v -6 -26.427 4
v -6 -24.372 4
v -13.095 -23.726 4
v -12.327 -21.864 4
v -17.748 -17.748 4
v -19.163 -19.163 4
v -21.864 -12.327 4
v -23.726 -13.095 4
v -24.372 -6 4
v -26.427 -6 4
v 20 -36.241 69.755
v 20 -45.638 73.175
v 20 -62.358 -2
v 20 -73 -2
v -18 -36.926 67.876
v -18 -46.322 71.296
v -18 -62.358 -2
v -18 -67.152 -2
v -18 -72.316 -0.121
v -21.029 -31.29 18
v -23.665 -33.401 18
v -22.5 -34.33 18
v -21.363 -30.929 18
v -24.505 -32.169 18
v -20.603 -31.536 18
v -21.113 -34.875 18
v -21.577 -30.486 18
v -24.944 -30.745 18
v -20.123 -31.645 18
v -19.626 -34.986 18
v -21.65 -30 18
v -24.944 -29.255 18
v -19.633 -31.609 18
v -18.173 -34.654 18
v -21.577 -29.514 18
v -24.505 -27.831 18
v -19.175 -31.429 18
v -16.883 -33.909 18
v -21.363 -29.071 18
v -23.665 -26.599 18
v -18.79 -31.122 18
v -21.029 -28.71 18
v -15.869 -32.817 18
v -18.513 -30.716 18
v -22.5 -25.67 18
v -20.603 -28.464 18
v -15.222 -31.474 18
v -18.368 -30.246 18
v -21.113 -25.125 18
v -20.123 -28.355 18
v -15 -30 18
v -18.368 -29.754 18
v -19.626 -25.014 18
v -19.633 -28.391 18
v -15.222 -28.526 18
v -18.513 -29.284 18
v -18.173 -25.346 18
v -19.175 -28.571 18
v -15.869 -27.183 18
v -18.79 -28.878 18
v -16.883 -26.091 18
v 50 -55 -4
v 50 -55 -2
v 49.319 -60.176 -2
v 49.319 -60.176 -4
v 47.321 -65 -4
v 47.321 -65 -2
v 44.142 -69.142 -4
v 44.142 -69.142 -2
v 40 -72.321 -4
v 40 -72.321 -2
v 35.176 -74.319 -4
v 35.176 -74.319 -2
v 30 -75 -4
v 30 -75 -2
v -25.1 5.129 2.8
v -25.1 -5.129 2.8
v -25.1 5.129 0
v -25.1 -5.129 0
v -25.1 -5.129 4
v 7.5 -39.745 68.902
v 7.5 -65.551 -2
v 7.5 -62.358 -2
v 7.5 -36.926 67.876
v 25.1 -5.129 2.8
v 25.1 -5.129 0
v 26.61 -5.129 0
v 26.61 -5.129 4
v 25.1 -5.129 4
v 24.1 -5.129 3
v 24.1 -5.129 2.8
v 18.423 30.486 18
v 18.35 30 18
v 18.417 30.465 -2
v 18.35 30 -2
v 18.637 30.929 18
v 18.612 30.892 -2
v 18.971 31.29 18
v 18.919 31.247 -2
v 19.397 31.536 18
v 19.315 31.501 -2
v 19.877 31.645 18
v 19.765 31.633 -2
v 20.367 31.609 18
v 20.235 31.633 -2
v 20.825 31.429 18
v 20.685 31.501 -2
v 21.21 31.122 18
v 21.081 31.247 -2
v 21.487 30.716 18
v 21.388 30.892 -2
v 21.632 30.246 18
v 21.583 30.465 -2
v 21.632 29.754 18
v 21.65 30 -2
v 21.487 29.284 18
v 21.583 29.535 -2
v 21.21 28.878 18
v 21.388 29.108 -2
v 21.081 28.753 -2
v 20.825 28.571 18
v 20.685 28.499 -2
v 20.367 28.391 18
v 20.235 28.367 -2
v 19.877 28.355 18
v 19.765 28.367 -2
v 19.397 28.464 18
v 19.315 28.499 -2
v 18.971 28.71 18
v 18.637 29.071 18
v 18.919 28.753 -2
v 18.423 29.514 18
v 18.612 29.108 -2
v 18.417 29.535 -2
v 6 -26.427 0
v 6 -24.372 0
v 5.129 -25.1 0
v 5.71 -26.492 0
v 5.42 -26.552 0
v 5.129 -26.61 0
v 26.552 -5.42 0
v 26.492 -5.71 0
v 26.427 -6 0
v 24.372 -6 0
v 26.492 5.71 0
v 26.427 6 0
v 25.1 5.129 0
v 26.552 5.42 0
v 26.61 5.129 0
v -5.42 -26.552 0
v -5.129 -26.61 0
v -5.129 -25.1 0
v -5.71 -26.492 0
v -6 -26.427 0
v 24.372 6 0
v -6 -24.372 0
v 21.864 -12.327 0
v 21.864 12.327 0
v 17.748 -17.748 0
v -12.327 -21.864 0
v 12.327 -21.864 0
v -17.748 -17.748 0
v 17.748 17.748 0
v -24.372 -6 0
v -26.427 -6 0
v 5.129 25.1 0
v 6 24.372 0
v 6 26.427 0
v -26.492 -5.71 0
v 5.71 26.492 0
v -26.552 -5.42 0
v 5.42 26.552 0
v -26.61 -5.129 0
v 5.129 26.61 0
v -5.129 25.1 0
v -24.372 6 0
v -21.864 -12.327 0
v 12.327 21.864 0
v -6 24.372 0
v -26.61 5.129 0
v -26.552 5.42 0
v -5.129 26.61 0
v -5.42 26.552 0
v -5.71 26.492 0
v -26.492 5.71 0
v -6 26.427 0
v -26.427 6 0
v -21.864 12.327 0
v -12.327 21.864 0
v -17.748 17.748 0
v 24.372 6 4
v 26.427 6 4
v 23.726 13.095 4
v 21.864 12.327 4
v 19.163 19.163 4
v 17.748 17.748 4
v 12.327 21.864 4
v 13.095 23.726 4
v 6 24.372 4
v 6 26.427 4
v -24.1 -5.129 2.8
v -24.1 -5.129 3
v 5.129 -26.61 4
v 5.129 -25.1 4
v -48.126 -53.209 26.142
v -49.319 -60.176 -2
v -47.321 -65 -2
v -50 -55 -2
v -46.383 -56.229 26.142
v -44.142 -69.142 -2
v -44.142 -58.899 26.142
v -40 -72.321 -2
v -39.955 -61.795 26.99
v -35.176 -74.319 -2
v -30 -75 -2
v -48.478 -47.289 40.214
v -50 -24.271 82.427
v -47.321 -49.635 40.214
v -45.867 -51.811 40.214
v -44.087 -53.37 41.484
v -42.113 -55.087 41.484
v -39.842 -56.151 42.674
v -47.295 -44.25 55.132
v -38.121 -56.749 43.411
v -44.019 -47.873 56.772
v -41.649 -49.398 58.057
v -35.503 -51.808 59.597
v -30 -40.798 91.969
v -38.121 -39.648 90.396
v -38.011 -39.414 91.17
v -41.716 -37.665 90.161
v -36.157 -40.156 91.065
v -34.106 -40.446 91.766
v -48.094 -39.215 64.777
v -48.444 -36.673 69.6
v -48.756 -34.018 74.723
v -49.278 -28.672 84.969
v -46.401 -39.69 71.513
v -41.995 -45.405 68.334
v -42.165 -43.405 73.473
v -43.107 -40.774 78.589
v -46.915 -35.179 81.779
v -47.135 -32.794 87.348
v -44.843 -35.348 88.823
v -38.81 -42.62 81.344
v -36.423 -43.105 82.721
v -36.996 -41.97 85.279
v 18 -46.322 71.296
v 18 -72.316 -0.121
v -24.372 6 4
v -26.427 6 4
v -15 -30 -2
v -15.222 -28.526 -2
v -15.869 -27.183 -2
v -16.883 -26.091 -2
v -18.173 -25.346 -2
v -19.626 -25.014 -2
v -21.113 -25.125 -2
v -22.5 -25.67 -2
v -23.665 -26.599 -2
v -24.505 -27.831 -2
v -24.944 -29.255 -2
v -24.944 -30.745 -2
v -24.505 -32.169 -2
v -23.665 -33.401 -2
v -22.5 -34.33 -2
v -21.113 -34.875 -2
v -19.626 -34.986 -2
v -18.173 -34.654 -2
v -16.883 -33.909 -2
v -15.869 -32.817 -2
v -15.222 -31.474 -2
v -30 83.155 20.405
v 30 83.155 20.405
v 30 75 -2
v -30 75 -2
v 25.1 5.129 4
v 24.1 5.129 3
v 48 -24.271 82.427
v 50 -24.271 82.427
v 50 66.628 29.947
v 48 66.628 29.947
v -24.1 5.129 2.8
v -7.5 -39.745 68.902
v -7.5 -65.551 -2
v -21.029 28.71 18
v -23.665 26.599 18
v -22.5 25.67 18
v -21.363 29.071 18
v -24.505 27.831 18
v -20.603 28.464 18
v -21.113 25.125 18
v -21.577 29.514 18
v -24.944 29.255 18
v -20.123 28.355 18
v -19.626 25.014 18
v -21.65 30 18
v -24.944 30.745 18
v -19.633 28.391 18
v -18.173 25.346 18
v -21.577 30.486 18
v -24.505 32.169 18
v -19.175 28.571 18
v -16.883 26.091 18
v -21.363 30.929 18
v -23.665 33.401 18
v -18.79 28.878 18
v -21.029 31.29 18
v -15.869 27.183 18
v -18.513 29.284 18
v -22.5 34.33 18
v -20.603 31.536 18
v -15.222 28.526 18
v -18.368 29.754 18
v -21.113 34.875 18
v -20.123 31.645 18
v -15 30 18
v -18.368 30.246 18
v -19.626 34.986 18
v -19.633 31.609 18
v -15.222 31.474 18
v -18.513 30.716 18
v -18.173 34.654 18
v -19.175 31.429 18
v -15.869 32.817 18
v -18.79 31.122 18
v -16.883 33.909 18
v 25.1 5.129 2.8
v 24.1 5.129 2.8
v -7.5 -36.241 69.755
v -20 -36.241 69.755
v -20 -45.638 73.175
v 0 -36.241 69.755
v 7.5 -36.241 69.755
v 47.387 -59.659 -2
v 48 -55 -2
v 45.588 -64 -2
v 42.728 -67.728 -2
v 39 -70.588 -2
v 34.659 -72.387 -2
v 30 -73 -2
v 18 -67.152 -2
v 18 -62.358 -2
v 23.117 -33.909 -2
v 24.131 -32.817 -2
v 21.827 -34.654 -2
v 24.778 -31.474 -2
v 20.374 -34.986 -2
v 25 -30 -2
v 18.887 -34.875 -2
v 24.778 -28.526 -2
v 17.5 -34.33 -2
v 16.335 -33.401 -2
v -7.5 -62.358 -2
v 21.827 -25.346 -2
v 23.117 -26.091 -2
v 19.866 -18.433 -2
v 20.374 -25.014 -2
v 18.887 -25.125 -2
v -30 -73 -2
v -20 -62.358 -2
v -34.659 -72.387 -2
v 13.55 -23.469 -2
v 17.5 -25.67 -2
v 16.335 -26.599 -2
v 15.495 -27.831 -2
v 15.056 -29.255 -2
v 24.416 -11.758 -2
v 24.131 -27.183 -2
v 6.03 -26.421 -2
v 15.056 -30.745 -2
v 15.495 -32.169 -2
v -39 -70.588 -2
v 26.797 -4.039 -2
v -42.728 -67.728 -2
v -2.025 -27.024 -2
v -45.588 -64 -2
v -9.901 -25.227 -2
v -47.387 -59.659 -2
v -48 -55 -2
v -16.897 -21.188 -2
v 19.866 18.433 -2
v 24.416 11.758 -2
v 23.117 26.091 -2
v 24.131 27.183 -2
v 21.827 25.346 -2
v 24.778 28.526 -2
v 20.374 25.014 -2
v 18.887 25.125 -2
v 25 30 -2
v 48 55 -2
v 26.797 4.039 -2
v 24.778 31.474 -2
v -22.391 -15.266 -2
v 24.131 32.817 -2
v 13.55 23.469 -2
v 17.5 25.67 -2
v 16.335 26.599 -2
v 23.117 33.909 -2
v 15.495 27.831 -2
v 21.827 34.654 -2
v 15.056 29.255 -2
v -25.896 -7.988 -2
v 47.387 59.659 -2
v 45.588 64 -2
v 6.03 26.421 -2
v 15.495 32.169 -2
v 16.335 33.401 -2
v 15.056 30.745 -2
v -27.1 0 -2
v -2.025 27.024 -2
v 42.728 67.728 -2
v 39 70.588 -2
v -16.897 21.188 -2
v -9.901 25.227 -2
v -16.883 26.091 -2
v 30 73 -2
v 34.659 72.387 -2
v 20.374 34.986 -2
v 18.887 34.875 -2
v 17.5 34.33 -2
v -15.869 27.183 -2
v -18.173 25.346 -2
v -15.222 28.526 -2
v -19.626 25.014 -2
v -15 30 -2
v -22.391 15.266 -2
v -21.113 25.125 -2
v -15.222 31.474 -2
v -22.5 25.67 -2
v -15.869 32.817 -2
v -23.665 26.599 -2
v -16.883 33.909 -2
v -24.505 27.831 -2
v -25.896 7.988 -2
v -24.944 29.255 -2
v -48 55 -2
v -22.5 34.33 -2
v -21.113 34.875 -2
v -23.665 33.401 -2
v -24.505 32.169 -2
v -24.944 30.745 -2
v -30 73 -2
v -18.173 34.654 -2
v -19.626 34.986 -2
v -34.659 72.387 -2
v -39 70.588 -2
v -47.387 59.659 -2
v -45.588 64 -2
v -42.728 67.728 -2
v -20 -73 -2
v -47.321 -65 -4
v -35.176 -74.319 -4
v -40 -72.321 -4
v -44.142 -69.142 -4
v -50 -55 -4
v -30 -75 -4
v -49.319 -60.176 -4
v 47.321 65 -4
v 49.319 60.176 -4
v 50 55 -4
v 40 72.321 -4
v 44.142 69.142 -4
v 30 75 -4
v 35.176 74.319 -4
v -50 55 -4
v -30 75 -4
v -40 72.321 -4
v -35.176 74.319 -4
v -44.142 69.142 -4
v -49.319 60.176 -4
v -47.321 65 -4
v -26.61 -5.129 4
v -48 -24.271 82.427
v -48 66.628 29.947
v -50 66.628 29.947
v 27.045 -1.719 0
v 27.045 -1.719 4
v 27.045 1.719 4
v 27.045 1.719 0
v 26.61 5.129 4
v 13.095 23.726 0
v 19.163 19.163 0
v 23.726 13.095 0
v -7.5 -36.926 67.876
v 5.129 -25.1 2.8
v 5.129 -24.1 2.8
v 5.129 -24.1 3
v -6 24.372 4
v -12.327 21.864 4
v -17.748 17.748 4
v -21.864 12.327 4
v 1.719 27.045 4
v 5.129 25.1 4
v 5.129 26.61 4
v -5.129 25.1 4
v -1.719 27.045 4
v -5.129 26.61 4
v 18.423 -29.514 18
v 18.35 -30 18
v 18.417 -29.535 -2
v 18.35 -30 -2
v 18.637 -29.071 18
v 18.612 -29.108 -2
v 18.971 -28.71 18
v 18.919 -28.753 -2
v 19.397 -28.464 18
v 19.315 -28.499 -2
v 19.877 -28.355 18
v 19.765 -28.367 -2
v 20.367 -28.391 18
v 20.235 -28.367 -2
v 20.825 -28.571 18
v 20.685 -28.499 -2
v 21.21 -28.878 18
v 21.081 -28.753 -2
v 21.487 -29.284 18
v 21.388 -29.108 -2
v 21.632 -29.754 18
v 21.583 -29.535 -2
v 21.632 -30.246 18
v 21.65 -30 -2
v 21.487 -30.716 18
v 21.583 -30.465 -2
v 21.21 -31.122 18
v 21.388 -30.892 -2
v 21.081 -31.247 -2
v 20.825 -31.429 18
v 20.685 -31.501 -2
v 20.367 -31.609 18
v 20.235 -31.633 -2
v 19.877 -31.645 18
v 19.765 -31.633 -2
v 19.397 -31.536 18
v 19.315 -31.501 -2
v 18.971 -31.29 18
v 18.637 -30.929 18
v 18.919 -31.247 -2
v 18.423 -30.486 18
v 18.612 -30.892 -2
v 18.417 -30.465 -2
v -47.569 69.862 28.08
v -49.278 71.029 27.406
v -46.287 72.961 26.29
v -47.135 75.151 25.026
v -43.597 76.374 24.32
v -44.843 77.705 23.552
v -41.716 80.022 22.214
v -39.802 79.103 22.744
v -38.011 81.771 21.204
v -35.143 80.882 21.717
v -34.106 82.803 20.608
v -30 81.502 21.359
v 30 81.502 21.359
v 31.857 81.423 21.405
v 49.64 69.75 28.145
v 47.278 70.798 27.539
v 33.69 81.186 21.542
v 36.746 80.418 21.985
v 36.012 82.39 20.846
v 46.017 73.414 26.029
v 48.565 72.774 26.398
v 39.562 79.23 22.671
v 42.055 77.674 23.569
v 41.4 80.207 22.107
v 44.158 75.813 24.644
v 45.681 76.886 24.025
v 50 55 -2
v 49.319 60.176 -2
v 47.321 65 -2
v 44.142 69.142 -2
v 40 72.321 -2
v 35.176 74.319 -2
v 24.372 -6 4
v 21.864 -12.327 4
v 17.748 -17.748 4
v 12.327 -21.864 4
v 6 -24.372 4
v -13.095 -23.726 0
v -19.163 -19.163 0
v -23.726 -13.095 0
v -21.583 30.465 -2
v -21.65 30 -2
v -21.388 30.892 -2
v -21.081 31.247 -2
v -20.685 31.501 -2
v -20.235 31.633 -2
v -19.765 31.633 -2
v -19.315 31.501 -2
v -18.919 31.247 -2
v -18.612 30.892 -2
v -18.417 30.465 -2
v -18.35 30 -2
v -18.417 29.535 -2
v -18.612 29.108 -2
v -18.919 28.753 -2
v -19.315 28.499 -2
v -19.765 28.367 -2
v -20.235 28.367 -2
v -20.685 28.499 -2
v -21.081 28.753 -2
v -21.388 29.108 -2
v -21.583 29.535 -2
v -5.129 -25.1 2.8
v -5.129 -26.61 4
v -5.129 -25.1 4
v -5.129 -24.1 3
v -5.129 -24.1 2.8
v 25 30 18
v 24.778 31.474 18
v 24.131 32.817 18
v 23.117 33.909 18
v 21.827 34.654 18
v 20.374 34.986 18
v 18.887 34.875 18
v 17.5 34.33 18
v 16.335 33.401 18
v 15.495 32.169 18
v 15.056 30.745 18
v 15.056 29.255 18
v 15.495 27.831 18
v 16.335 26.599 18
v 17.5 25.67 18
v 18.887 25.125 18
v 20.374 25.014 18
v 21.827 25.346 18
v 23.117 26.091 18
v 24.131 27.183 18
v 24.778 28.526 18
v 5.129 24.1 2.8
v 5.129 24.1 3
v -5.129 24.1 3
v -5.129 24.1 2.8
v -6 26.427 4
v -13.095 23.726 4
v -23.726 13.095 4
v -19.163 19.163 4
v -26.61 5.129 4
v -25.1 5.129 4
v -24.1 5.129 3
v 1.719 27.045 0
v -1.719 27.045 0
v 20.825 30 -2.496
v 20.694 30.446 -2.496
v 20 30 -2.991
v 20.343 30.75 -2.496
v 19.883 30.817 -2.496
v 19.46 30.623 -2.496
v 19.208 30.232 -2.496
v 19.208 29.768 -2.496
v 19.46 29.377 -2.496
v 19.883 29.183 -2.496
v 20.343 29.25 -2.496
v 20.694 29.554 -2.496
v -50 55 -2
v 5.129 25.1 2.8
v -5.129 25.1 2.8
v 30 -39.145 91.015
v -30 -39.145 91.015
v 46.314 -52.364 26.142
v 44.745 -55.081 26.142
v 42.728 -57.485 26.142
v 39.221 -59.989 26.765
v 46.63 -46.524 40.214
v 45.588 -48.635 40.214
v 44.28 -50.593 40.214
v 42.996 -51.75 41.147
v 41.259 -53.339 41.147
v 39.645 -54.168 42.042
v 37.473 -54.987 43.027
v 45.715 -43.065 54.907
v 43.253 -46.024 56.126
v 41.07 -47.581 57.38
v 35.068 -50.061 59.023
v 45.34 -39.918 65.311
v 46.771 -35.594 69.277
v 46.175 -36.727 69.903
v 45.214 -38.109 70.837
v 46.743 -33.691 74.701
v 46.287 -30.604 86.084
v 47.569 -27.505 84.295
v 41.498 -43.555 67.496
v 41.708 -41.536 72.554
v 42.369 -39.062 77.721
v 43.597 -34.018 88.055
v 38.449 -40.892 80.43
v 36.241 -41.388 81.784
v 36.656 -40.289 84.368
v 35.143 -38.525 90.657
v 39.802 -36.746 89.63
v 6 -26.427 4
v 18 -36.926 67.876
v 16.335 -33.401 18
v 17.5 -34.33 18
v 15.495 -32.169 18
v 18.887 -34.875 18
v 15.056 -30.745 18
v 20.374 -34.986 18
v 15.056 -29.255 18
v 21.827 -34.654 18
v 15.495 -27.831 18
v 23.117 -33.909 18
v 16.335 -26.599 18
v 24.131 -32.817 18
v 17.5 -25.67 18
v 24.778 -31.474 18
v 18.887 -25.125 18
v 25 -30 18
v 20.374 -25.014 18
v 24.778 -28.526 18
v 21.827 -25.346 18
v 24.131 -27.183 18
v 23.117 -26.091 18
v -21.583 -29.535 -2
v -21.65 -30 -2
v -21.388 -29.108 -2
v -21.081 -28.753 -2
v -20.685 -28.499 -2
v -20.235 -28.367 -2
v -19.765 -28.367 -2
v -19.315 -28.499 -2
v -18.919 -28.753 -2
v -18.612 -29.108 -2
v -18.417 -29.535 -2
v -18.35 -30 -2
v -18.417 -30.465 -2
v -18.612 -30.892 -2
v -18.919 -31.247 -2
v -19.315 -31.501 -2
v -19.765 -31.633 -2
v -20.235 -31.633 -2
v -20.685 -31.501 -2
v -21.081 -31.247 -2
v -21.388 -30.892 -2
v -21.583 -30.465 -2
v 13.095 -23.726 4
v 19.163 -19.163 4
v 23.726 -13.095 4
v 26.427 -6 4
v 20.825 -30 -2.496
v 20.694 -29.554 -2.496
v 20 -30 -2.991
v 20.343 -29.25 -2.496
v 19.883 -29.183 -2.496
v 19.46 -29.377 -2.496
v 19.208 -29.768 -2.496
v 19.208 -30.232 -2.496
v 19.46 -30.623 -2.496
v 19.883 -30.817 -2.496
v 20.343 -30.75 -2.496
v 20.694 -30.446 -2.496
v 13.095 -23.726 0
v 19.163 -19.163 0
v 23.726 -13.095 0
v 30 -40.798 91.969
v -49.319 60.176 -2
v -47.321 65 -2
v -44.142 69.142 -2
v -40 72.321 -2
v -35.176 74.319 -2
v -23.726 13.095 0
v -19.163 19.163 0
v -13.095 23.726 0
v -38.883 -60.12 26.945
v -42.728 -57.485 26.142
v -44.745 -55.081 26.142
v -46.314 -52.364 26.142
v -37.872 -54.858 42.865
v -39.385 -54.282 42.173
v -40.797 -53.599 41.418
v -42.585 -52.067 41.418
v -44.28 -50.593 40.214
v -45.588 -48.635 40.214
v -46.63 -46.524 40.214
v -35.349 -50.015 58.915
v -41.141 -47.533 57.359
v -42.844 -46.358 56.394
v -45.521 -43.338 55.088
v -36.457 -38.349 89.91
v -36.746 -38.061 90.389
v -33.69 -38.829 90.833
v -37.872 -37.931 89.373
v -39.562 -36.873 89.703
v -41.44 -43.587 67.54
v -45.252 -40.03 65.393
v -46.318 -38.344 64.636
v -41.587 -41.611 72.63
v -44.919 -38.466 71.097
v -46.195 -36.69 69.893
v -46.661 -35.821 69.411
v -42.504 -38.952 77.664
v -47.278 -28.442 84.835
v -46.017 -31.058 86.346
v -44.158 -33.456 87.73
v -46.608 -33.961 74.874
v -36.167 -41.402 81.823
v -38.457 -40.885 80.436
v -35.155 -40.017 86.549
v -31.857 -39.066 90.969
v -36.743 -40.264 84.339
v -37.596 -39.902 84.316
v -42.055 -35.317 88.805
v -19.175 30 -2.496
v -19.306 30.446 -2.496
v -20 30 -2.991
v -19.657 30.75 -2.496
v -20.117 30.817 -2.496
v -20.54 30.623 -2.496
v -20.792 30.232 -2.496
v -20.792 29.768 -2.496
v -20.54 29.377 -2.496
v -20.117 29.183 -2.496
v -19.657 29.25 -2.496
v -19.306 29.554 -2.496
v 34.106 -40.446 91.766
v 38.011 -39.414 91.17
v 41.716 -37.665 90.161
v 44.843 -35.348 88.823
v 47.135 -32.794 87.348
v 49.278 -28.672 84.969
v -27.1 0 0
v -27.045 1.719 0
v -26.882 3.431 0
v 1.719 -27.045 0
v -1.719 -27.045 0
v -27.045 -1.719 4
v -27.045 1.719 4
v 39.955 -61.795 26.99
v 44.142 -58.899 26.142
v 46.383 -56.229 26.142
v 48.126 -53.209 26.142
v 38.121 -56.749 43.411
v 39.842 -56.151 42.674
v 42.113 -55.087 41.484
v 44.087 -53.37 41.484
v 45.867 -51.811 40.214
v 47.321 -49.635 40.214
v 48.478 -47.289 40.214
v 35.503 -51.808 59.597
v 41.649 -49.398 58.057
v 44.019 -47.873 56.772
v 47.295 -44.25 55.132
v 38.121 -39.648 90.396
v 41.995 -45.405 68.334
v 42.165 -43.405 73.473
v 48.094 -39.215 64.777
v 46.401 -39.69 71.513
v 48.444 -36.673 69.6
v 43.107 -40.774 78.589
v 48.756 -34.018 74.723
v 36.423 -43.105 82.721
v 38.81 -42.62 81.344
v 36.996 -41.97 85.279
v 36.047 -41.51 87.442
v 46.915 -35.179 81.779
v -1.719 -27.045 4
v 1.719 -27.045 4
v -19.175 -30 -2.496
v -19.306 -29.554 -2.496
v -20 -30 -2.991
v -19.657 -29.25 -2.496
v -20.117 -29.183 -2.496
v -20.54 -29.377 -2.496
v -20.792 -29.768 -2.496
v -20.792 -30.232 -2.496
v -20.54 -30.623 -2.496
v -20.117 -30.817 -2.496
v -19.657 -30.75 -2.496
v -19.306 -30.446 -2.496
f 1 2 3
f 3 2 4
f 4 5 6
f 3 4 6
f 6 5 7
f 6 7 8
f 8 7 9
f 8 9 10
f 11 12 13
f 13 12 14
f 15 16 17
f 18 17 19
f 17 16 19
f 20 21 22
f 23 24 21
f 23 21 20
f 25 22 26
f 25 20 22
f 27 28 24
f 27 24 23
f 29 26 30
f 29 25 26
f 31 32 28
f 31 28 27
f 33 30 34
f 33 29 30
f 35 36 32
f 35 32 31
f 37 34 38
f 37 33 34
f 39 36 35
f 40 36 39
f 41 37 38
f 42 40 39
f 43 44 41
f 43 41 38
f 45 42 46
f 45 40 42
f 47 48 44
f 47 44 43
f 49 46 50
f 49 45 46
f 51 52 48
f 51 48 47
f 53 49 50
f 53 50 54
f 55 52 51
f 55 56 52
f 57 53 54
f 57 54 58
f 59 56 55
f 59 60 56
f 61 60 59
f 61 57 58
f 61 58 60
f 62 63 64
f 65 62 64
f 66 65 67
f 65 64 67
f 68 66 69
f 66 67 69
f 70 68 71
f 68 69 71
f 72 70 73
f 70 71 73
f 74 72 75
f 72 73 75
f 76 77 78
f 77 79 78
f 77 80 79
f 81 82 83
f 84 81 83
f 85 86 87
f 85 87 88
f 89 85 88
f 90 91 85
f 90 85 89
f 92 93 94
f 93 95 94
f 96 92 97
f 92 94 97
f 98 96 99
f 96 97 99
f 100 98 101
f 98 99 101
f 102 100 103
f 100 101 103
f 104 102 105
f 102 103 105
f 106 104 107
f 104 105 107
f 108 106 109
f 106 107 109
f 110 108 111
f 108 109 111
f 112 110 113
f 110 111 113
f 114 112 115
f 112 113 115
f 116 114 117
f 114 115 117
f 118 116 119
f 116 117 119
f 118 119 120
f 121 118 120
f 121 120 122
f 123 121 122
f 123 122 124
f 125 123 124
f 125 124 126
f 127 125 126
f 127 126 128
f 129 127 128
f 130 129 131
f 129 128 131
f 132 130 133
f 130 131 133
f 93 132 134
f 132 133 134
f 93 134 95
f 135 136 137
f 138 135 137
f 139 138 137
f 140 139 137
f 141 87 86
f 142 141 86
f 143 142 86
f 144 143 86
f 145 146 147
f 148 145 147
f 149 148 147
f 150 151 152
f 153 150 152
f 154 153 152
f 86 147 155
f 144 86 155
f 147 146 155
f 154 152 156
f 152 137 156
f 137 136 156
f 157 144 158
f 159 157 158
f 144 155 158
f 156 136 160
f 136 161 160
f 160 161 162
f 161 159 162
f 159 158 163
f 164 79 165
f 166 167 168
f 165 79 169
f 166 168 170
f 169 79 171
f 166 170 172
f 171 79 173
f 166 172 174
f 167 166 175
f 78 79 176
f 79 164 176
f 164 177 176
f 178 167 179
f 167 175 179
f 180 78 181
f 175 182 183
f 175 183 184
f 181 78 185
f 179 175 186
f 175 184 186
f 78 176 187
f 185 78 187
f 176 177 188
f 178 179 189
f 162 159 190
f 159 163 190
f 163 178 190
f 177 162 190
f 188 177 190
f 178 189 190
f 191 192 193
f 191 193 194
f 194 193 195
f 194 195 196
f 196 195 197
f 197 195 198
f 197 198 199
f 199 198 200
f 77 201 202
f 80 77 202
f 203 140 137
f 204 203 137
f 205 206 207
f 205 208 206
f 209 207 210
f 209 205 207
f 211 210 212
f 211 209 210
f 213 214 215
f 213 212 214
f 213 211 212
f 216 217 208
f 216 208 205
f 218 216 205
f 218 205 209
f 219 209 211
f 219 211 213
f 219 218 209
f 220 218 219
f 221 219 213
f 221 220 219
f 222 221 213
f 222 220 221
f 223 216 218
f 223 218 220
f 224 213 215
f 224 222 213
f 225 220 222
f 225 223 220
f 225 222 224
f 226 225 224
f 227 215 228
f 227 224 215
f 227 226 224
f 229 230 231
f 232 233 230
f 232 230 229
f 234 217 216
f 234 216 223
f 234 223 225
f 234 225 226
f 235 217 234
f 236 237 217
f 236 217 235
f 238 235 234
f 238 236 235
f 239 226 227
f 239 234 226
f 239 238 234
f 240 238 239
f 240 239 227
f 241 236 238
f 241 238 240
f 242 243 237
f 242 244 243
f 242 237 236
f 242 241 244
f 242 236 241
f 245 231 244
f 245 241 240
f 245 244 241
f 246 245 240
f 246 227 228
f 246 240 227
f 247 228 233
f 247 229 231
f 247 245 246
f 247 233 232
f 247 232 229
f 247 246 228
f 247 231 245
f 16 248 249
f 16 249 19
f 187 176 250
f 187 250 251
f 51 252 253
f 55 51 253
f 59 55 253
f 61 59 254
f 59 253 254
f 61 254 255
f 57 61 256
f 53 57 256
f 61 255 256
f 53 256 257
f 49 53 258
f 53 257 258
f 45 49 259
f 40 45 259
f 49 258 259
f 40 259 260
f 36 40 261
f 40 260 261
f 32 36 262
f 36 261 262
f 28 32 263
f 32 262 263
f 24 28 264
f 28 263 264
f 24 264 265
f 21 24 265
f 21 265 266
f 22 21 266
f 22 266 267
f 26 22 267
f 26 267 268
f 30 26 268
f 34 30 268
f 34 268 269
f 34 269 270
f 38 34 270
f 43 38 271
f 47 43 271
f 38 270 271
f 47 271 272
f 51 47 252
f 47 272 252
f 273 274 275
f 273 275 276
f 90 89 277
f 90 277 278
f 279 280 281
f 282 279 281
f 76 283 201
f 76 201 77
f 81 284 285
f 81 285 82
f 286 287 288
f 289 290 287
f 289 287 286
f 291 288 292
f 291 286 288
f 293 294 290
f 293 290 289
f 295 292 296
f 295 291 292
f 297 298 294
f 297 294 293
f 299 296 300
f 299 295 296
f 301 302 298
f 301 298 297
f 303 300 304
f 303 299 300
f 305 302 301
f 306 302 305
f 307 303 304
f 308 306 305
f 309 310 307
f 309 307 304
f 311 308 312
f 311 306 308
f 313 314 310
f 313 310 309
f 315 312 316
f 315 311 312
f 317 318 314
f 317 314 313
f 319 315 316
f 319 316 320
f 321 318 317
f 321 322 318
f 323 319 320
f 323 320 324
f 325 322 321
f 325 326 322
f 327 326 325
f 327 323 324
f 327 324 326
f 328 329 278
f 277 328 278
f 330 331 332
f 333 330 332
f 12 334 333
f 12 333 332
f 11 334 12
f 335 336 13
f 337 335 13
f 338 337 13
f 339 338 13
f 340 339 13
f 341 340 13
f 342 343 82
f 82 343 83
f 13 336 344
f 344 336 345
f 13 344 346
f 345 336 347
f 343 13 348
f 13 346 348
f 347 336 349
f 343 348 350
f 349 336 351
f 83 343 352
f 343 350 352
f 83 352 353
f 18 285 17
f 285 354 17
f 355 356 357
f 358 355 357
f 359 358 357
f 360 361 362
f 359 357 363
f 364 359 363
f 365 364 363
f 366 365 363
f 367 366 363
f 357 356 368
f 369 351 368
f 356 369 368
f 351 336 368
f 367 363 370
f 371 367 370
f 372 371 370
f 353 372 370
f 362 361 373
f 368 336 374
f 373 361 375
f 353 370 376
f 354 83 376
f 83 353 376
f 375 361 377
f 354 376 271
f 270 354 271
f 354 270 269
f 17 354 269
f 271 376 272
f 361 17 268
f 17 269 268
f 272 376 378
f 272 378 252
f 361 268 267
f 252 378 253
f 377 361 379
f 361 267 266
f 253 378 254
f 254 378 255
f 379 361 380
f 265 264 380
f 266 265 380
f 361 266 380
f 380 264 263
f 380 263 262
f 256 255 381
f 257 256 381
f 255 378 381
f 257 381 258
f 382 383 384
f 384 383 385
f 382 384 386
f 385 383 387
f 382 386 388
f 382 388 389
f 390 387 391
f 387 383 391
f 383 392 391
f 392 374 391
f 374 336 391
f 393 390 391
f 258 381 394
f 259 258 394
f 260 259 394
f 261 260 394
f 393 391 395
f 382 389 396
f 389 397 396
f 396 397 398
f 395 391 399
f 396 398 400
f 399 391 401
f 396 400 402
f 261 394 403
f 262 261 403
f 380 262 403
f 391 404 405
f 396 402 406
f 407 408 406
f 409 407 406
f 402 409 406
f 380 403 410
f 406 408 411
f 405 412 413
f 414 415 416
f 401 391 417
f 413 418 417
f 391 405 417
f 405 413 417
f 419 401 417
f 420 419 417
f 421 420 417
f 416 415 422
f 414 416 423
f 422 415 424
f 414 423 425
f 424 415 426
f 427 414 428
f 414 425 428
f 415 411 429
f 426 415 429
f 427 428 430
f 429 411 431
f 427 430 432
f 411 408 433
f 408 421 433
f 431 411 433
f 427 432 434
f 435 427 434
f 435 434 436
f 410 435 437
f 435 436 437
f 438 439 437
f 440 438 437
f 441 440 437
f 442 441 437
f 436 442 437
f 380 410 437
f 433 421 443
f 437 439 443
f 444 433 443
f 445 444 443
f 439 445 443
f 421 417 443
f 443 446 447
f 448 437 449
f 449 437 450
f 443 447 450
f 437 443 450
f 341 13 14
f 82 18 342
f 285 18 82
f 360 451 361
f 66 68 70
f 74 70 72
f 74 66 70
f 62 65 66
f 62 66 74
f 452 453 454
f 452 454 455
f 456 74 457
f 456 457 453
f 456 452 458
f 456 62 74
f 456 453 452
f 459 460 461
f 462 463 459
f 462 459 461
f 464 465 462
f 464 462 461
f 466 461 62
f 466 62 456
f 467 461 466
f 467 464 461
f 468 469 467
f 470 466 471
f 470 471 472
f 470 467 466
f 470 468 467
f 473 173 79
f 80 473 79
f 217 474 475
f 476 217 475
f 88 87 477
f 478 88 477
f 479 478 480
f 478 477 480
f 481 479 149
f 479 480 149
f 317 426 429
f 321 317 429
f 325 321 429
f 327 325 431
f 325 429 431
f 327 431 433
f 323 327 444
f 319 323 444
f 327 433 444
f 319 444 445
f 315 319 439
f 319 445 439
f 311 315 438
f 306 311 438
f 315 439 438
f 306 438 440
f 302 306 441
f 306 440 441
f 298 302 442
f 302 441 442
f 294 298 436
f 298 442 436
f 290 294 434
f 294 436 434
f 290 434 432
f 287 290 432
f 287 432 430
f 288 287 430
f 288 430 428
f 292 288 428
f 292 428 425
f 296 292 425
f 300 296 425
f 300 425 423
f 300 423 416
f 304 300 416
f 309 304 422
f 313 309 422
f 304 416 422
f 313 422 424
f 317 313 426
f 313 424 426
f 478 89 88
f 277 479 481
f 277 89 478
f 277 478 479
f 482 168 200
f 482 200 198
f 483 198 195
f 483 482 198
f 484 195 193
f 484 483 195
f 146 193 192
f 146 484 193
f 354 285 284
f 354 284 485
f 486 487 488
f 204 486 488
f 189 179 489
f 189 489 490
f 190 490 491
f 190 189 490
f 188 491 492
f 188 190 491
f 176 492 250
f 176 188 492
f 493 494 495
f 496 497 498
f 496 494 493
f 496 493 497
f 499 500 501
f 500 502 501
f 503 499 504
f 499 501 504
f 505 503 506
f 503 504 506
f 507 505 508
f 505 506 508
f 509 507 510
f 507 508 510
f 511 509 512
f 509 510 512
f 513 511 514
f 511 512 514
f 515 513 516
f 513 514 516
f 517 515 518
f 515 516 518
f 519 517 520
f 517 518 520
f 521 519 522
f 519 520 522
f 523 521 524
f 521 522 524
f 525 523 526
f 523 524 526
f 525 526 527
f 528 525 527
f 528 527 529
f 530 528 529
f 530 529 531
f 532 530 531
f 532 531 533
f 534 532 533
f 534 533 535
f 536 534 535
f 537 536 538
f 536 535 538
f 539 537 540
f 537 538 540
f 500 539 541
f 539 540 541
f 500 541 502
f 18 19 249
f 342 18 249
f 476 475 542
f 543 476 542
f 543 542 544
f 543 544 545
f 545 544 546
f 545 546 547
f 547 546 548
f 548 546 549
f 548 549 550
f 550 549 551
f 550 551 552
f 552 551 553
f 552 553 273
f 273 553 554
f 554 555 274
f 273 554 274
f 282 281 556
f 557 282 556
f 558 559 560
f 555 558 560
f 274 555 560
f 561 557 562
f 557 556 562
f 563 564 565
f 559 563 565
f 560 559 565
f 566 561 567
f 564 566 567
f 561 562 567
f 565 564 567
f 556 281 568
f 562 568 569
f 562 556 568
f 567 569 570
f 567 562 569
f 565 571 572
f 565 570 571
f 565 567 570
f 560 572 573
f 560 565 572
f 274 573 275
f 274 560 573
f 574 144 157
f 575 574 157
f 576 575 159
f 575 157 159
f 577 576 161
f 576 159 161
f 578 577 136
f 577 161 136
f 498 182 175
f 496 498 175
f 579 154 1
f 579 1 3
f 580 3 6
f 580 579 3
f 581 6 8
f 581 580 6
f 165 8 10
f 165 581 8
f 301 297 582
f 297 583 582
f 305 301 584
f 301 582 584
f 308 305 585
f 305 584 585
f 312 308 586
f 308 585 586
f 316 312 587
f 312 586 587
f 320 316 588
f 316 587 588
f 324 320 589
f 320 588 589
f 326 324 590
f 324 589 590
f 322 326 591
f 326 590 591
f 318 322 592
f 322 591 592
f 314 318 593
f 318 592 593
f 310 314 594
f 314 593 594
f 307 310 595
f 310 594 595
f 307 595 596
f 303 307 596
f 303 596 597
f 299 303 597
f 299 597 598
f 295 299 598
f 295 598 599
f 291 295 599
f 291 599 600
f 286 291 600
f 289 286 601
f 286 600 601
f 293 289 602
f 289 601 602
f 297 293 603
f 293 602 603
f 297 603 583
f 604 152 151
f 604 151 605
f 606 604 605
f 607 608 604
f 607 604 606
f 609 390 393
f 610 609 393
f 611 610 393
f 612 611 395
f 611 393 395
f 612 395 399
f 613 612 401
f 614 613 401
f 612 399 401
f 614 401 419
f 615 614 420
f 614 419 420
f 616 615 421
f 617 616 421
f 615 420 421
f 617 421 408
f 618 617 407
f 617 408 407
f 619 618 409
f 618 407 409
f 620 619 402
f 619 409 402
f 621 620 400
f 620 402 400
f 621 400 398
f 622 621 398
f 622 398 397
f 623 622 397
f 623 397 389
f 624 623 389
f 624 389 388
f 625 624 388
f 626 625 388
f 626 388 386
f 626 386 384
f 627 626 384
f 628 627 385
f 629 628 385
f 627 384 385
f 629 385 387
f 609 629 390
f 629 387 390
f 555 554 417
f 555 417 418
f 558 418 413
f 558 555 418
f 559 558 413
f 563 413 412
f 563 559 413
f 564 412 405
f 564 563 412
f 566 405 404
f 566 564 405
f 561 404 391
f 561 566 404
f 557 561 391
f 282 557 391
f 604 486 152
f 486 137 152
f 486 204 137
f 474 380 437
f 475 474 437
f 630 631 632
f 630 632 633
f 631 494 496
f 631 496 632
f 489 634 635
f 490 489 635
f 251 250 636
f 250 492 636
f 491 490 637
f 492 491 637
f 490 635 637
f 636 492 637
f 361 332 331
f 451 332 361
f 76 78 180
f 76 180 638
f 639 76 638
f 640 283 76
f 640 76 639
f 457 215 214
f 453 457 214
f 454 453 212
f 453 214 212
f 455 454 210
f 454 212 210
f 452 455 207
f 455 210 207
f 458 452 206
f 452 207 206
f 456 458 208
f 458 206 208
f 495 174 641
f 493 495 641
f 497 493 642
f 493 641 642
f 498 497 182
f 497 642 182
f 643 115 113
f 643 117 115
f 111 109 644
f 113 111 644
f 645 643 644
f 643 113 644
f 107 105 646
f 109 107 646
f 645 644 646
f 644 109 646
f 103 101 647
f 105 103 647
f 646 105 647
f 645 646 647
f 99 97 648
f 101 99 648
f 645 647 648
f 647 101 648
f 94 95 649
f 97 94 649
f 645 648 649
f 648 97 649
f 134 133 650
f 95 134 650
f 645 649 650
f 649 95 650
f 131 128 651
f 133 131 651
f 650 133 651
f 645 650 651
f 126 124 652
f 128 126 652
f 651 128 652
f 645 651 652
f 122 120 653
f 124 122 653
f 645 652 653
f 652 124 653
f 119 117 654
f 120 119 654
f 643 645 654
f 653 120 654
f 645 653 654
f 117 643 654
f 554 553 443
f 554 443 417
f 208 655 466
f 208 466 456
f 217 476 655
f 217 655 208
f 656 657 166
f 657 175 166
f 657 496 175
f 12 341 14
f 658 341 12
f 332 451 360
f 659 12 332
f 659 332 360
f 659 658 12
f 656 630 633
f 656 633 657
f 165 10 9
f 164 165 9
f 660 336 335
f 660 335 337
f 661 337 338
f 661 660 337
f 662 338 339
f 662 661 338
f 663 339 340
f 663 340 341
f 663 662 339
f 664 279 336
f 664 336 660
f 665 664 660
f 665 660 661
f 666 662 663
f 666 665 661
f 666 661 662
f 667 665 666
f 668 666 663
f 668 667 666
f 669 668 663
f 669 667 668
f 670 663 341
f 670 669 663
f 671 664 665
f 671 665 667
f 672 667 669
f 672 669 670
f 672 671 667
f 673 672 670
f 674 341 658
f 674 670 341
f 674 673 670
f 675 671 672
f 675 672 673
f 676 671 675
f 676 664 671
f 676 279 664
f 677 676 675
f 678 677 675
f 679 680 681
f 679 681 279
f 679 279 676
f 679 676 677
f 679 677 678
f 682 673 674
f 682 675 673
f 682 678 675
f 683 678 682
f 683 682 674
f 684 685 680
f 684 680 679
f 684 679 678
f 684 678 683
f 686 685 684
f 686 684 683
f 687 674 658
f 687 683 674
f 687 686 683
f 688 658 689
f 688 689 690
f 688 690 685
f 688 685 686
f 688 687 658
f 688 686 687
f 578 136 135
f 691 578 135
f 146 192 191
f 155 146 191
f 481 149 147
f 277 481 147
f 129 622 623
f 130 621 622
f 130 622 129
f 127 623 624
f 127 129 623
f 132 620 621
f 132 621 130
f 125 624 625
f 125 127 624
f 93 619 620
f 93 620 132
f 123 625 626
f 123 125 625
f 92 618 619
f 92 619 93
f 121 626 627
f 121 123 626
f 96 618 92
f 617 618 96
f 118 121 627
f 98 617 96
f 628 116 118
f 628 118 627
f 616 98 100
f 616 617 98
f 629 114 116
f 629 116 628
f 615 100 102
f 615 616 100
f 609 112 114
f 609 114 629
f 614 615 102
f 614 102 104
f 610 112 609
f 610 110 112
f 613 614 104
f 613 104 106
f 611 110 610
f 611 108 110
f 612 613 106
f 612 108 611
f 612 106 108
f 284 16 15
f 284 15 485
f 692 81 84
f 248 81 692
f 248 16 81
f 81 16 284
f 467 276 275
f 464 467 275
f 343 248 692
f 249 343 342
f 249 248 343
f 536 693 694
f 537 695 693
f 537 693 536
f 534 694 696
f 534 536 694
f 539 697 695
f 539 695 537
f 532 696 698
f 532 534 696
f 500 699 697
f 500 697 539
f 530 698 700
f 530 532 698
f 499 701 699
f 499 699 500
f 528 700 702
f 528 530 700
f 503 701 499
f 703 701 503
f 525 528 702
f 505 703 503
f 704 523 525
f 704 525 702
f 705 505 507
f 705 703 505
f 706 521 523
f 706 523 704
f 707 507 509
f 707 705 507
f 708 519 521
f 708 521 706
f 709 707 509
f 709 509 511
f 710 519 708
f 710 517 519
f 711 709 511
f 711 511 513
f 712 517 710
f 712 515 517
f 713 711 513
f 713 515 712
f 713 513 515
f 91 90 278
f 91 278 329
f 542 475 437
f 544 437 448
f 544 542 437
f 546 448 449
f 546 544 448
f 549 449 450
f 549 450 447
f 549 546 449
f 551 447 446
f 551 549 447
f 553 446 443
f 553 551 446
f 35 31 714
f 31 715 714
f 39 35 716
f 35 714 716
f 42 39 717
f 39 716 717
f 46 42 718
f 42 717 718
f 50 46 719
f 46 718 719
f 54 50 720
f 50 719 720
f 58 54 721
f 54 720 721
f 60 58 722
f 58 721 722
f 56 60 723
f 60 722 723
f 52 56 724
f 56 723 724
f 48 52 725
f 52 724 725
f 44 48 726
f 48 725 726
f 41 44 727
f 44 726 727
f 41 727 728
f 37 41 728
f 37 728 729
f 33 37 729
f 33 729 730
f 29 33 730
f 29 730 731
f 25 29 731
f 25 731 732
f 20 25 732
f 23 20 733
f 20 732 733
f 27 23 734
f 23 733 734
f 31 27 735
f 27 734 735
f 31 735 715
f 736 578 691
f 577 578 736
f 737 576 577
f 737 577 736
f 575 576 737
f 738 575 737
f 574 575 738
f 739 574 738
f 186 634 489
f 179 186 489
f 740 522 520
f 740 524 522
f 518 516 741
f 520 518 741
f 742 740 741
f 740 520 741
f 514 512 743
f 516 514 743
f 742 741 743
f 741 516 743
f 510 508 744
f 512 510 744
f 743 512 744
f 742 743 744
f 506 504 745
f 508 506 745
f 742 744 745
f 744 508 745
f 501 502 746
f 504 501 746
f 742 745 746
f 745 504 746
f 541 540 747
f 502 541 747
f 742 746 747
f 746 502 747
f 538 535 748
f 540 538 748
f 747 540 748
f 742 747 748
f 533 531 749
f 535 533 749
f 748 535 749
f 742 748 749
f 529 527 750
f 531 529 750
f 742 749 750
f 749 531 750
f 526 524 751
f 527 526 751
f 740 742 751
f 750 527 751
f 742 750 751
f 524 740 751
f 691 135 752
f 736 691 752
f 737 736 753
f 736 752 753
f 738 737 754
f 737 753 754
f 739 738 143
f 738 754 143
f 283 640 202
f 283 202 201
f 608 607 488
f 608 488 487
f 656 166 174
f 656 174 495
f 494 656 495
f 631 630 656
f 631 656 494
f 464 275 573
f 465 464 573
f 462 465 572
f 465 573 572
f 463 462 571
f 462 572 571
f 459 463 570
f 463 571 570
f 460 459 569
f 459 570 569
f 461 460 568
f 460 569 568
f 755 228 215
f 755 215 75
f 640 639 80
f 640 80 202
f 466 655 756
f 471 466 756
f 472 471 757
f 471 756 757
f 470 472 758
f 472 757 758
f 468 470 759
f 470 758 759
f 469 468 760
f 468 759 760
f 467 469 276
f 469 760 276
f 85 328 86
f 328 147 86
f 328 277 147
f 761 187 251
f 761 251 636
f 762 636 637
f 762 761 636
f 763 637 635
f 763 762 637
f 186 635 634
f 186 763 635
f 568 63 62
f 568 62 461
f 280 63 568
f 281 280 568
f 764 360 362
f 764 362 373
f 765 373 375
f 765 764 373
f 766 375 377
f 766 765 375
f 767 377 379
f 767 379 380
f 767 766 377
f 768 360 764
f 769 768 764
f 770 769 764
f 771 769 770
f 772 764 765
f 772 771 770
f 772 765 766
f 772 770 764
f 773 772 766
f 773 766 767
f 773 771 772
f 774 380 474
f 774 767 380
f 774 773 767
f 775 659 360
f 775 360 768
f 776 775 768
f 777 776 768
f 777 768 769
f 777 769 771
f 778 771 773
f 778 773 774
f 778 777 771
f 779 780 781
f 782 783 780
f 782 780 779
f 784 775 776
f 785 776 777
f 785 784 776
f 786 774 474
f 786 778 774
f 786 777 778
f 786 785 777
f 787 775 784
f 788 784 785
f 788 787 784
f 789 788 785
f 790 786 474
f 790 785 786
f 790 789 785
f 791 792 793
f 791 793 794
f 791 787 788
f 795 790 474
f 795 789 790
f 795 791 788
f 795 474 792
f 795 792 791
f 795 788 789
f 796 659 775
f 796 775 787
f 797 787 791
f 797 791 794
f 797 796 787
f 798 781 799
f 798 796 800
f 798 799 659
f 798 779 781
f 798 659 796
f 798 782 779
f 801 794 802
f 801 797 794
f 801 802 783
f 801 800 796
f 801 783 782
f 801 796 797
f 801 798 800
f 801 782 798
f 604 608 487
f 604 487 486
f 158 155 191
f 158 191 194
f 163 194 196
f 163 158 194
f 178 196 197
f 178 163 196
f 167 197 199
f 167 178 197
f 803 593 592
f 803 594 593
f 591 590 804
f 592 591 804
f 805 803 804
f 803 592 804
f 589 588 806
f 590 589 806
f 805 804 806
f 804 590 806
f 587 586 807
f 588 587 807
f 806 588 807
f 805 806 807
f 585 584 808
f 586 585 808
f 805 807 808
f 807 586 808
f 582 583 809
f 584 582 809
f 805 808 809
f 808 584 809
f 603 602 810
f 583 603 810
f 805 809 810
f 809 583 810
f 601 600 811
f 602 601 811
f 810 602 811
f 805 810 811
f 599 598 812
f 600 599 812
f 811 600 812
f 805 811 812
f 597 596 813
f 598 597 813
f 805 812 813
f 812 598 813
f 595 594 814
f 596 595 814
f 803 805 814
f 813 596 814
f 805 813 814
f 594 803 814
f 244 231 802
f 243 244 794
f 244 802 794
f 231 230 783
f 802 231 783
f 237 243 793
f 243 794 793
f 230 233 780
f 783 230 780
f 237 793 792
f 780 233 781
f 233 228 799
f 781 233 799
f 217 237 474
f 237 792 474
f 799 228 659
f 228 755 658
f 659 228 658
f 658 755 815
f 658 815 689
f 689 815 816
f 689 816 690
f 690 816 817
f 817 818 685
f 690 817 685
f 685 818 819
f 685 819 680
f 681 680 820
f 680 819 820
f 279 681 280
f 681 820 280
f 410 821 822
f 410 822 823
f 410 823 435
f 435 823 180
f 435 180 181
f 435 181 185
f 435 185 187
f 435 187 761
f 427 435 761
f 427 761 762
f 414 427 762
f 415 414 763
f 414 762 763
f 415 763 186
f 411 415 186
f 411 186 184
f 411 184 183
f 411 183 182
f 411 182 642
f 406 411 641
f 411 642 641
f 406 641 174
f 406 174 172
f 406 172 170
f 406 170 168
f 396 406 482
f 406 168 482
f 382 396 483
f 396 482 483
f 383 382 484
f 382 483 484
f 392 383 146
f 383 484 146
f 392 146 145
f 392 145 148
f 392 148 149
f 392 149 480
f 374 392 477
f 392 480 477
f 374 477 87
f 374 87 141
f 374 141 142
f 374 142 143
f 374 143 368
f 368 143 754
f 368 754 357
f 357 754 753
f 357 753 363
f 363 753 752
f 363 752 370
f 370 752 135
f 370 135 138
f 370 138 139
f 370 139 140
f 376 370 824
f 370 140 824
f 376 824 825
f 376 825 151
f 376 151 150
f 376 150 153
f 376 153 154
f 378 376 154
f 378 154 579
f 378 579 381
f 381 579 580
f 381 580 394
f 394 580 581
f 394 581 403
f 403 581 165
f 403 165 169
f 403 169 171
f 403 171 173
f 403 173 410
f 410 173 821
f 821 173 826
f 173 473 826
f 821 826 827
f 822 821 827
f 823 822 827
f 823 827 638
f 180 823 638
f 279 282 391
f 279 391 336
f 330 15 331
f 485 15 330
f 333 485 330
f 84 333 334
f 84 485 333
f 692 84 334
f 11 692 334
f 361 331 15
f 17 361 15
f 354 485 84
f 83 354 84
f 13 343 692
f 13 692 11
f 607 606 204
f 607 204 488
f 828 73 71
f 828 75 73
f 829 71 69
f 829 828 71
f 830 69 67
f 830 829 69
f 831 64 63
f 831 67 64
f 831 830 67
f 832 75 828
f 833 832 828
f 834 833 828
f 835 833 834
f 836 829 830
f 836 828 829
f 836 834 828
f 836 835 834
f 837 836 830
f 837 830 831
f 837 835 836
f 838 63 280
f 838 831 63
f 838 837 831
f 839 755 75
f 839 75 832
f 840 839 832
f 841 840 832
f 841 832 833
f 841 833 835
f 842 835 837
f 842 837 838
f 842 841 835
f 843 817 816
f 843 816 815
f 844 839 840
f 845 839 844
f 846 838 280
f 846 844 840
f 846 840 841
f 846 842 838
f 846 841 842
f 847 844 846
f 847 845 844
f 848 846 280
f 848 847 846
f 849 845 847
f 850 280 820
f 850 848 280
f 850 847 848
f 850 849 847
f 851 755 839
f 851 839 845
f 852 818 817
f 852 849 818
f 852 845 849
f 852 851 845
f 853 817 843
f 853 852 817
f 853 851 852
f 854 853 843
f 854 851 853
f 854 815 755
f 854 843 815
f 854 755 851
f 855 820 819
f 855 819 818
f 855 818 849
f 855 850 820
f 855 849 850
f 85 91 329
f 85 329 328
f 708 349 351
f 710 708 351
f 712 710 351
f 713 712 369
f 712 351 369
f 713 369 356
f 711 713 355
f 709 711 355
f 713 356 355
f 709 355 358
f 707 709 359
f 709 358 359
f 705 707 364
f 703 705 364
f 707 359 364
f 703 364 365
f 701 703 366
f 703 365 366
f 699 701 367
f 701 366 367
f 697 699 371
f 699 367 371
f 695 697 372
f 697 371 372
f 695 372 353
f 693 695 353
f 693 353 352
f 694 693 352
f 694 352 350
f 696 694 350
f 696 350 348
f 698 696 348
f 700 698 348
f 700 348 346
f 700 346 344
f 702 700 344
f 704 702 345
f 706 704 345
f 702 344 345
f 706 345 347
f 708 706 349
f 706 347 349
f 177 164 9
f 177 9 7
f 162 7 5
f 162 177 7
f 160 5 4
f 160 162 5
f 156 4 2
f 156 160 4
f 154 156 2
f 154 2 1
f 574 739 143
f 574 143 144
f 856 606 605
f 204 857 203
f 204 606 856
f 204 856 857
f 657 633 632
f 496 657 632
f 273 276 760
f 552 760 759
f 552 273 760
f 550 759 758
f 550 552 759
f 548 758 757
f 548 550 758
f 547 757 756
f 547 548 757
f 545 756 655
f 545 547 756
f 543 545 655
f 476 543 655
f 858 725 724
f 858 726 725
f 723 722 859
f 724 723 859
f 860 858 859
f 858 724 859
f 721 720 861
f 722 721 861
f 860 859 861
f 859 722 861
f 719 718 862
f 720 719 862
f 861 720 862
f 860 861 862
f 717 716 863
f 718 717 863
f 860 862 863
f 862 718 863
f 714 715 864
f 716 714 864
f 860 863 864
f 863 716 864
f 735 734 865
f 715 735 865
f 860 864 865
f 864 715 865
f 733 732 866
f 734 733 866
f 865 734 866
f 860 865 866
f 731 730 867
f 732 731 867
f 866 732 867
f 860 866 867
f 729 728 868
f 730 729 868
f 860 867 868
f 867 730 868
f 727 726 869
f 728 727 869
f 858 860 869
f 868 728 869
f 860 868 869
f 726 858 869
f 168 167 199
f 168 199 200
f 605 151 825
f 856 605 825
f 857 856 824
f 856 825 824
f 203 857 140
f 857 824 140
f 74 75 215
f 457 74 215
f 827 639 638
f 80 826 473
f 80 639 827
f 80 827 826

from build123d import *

# Parameters (mm, degrees)
AUFSATZ_LINEAR_AUSTRAGEN1_DEPTH      = 4
AUFSATZ_LINEAR_AUSTRAGEN1_2_DEPTH    = 4
AUFSATZ_LINEAR_AUSTRAGEN1_3_DEPTH    = 4
AUFSATZ_LINEAR_AUSTRAGEN1_4_DEPTH    = 4
SKIZZE2_R                            = 27.1
AUFSATZ_LINEAR_AUSTRAGEN2_DEPTH      = 2
AUFSATZ_LINEAR_AUSTRAGEN3_DEPTH      = 4
AUFSATZ_LINEAR_AUSTRAGEN4_DEPTH      = 10.258635
KREISMUSTER3_COUNT                   = 4
AUFSATZ_LINEAR_AUSTRAGEN5_DEPTH      = 2
SCHNITT_LINEAR_AUSTRAGEN1_DEPTH      = 1
SCHNITT_LINEAR_AUSTRAGEN1_DEPTH_BACK = 101
SKIZZE11_W                           = 40
SKIZZE11_H                           = 80
SKIZZE11_W_2                         = 36
SKIZZE11_H_2                         = 76
AUFSATZ_LINEAR_AUSTRAGEN6_DEPTH      = 10
AUFSATZ_LINEAR_AUSTRAGEN7_REACH      = 85.898
SKIZZE12_W                           = 7.5
SKIZZE12_H                           = 3
SCHNITT_LINEAR_AUSTRAGEN2_DEPTH      = 1.0000001
SCHNITT_LINEAR_AUSTRAGEN2_DEPTH_BACK = 101.0000001
SKIZZE14_R                           = 5
AUFSATZ_LINEAR_AUSTRAGEN8_DEPTH      = 20
KERNLOCH_F_R_M4_GEWINDE1_D           = 3.3
KERNLOCH_F_R_M4_GEWINDE1_DEPTH       = 20
KERNLOCH_F_R_M4_GEWINDE1_TIP         = 0.991420021


with BuildPart() as part:
    # Skizze1 → Aufsatz-Linear austragen1 (new body)
    with BuildSketch(Plane.XY):
        with BuildLine():
            Line((-6, -24.372320366), (-6, -26.427447853))
            ThreePointArc((-6, -26.427447853), (-19.16259377, -19.16259377), (-26.427447853, -6))
            Line((-26.427447853, -6), (-24.372320366, -6))
            ThreePointArc((-24.372320366, -6), (-17.748380208, -17.748380208), (-6, -24.372320366))
        make_face()
    extrude(amount=AUFSATZ_LINEAR_AUSTRAGEN1_DEPTH)



with BuildPart() as body_2:
    # Skizze1 → Aufsatz-Linear austragen1 2 (new body)
    with BuildSketch(Plane.XY):
        with BuildLine():
            Line((6, -24.372320366), (6, -26.427447853))
            ThreePointArc((6, -26.427447853), (19.16259377, -19.16259377), (26.427447853, -6))
            Line((26.427447853, -6), (24.372320366, -6))
            ThreePointArc((24.372320366, -6), (17.748380208, -17.748380208), (6, -24.372320366))
        make_face()
    extrude(amount=AUFSATZ_LINEAR_AUSTRAGEN1_2_DEPTH)


with BuildPart() as body_3:
    # Skizze1 → Aufsatz-Linear austragen1 3 (new body)
    with BuildSketch(Plane.XY):
        with BuildLine():
            Line((-24.372320366, 6), (-26.427447853, 6))
            ThreePointArc((-26.427447853, 6), (-19.16259377, 19.16259377), (-6, 26.427447853))
            Line((-6, 26.427447853), (-6, 24.372320366))
            ThreePointArc((-6, 24.372320366), (-17.748380208, 17.748380208), (-24.372320366, 6))
        make_face()
    extrude(amount=AUFSATZ_LINEAR_AUSTRAGEN1_3_DEPTH)


with BuildPart() as body_4:
    # Skizze1 → Aufsatz-Linear austragen1 4 (new body)
    with BuildSketch(Plane.XY):
        with BuildLine():
            Line((6, 24.372320366), (6, 26.427447853))
            ThreePointArc((6, 26.427447853), (19.16259377, 19.16259377), (26.427447853, 6))
            Line((26.427447853, 6), (24.372320366, 6))
            ThreePointArc((24.372320366, 6), (17.748380208, 17.748380208), (6, 24.372320366))
        make_face()
    extrude(amount=AUFSATZ_LINEAR_AUSTRAGEN1_4_DEPTH)


with BuildPart() as part_1:
    add(part.part)

    add(body_2.part)  # Aufsatz-Linear austragen2 merges body 2

    add(body_3.part)  # Aufsatz-Linear austragen2 merges body 3

    add(body_4.part)  # Aufsatz-Linear austragen2 merges body 4
    # Skizze2 → Aufsatz-Linear austragen2 (add)
    with BuildSketch(Plane(origin=(0, 0, 0), x_dir=(-1, 0, 0), z_dir=(0, 0, -1))):
        Circle(SKIZZE2_R)
    extrude(amount=AUFSATZ_LINEAR_AUSTRAGEN2_DEPTH)


with BuildPart() as body_2_2:
    # Skizze3 → Aufsatz-Linear austragen3 (new body)
    with BuildSketch(Plane.XY):
        with BuildLine():
            Line((5.129317712, -26.610150315), (5.129317712, -25.1))
            Line((5.129317712, -25.1), (0, -25.1))
            Line((0, -25.1), (-5.129317712, -25.1))
            Line((-5.129317712, -25.1), (-5.129317712, -26.610150315))
            ThreePointArc((-5.129317712, -26.610150315), (0, -27.1), (5.129317712, -26.610150315))
        make_face()
    extrude(amount=AUFSATZ_LINEAR_AUSTRAGEN3_DEPTH)


with BuildPart() as body_3_2:
    # Skizze4 → Aufsatz-Linear austragen4 (new body)
    with BuildSketch(Plane.ZY.offset(5.129317712)):
        Polygon((4, -25.1), (3, -24.1), (2.8, -24.1), (2.8, -25.1), align=None)
    extrude(amount=-AUFSATZ_LINEAR_AUSTRAGEN4_DEPTH)


with BuildPart() as kreismuster3_1:
    # Kreismuster3: pattern copy
    add(body_3_2.part.rotate(Axis((0, 0, 0), (0, 0, 1)), 1 * 360 / KREISMUSTER3_COUNT))


with BuildPart() as kreismuster3_2:
    # Kreismuster3: pattern copy
    add(body_3_2.part.rotate(Axis((0, 0, 0), (0, 0, 1)), 2 * 360 / KREISMUSTER3_COUNT))


with BuildPart() as kreismuster3_3:
    # Kreismuster3: pattern copy
    add(body_3_2.part.rotate(Axis((0, 0, 0), (0, 0, 1)), 3 * 360 / KREISMUSTER3_COUNT))


with BuildPart() as kreismuster3_4:
    # Kreismuster3: pattern copy
    add(body_2_2.part.rotate(Axis((0, 0, 0), (0, 0, 1)), 1 * 360 / KREISMUSTER3_COUNT))


with BuildPart() as kreismuster3_5:
    # Kreismuster3: pattern copy
    add(body_2_2.part.rotate(Axis((0, 0, 0), (0, 0, 1)), 2 * 360 / KREISMUSTER3_COUNT))


with BuildPart() as kreismuster3_6:
    # Kreismuster3: pattern copy
    add(body_2_2.part.rotate(Axis((0, 0, 0), (0, 0, 1)), 3 * 360 / KREISMUSTER3_COUNT))


with BuildPart() as part_2:
    add(part_1.part)

    # Kombinieren1: union Kreismuster3_6, Kreismuster3_5, Kreismuster3_4, body 2 2, Kreismuster3_3, Kreismuster3_2, Kreismuster3_1, body 3 2
    add(kreismuster3_6.part)
    add(kreismuster3_5.part)
    add(kreismuster3_4.part)
    add(body_2_2.part)
    add(kreismuster3_3.part)
    add(kreismuster3_2.part)
    add(kreismuster3_1.part)
    add(body_3_2.part)

    # Skizze5 → Aufsatz-Linear austragen5 (add)
    with BuildSketch(Plane(origin=(0, 0, -2), x_dir=(-1, 0, 0), z_dir=(0, 0, -1))):
        with BuildLine():
            Line((30, 75), (-30, 75))
            ThreePointArc((-30, 75), (-44.142135624, 69.142135624), (-50, 55))
            Line((-50, 55), (-50, -55))
            ThreePointArc((-50, -55), (-44.142135624, -69.142135624), (-30, -75))
            Line((-30, -75), (30, -75))
            ThreePointArc((30, -75), (44.142135624, -69.142135624), (50, -55))
            Line((50, -55), (50, 55))
            ThreePointArc((50, 55), (44.142135624, 69.142135624), (30, 75))
        make_face()
    extrude(amount=AUFSATZ_LINEAR_AUSTRAGEN5_DEPTH)

    # Austragung2: sweep along a path in Skizze7
    with BuildLine(Plane(origin=(0, 0, 0), x_dir=(0, 0, -1), z_dir=(1, 0, 0))) as austragung2_path:
        Line((2, 75), (-91.969262079, 109.202014333))
    # Skizze6 → Austragung2 (sweep)
    with BuildSketch(Plane.XY.offset(-2)):
        with BuildLine():
            Line((50, -55), (50, 55))
            ThreePointArc((50, 55), (44.142135624, 69.142135624), (30, 75))
            Line((30, 75), (-30, 75))
            ThreePointArc((-30, 75), (-44.142135624, 69.142135624), (-50, 55))
            Line((-50, 55), (-50, -55))
            ThreePointArc((-50, -55), (-44.142135624, -69.142135624), (-30, -75))
            Line((-30, -75), (30, -75))
            ThreePointArc((30, -75), (44.142135624, -69.142135624), (50, -55))
        make_face()
        with BuildLine():
            Line((48, -55), (48, 55))
            ThreePointArc((48, 55), (42.727922061, 67.727922061), (30, 73))
            Line((30, 73), (-30, 73))
            ThreePointArc((-30, 73), (-42.727922061, 67.727922061), (-48, 55))
            Line((-48, 55), (-48, -55))
            ThreePointArc((-48, -55), (-42.727922061, -67.727922061), (-30, -73))
            Line((-30, -73), (30, -73))
            ThreePointArc((30, -73), (42.727922061, -67.727922061), (48, -55))
        make_face(mode=Mode.SUBTRACT)
    sweep(path=austragung2_path.line)

    # Skizze8 → Schnitt-Linear austragen1 (cut, two sides)
    with BuildSketch(Plane(origin=(50, 0, 0), x_dir=(0, 0, -1), z_dir=(1, 0, 0))) as schnitt_linear_austragen1_sk:
        Polygon((-91.969262079, -20.797985667), (-82.427373137, -24.270949221), (-29.94698396, 66.627751236), (-91.969262079, 89.202014333), align=None)
        Polygon((-91.969262079, 89.202014333), (-29.94698396, 66.627751236), (-20.405095018, 83.154787683), (-91.969262079, 109.202014333), align=None)
        Polygon((-91.969262079, -20.797985667), (-91.969262079, -40.797985667), (-82.427373137, -24.270949221), align=None)
    extrude(amount=SCHNITT_LINEAR_AUSTRAGEN1_DEPTH, mode=Mode.SUBTRACT)
    extrude(schnitt_linear_austragen1_sk.sketch, amount=-SCHNITT_LINEAR_AUSTRAGEN1_DEPTH_BACK, mode=Mode.SUBTRACT)

    # Skizze11 → Aufsatz-Linear austragen6 (add)
    with BuildSketch(Plane(origin=(0, -63.817834564, 23.227792197), x_dir=(1, 0, 0), z_dir=(0, 0.939692621, -0.342020143))):
        with Locations((0, -13.153144296)):
            Rectangle(SKIZZE11_W, SKIZZE11_H)
        with Locations((0, -13.153144296)):
            Rectangle(SKIZZE11_W_2, SKIZZE11_H_2, mode=Mode.SUBTRACT)
    extrude(amount=AUFSATZ_LINEAR_AUSTRAGEN6_DEPTH)

    # Aufsatz-Linear austragen7: up to this face of the body (flat: up to its plane)
    aufsatz_linear_austragen7_end = Plane(part_2.part.faces().sort_by_distance((0, 0.797060642, -4))[0])
    # Skizze12 → Aufsatz-Linear austragen7 (add, up to the picked face)
    with BuildSketch(Plane(origin=(0, 18.17944603, 49.947617466), x_dir=(1, 0, 0), z_dir=(0, 0.342020143, 0.939692621)), mode=Mode.PRIVATE) as aufsatz_linear_austragen7_sk1:
        with Locations((-3.75, -59.413521031)):
            Rectangle(SKIZZE12_W, SKIZZE12_H)
    aufsatz_linear_austragen7_tool1 = split(extrude(aufsatz_linear_austragen7_sk1.sketch, amount=-AUFSATZ_LINEAR_AUSTRAGEN7_REACH, mode=Mode.PRIVATE), bisect_by=aufsatz_linear_austragen7_end, keep=Keep.BOTH, mode=Mode.PRIVATE)
    add(aufsatz_linear_austragen7_tool1.solids().sort_by_distance((-3.75, -37.651001, 70.268238))[0])
    # Skizze12 → Aufsatz-Linear austragen7 (add, up to the picked face)
    with BuildSketch(Plane(origin=(0, 18.17944603, 49.947617466), x_dir=(1, 0, 0), z_dir=(0, 0.342020143, 0.939692621)), mode=Mode.PRIVATE) as aufsatz_linear_austragen7_sk2:
        with Locations((3.75, -59.413521031)):
            Rectangle(SKIZZE12_W, SKIZZE12_H)
    aufsatz_linear_austragen7_tool2 = split(extrude(aufsatz_linear_austragen7_sk2.sketch, amount=-AUFSATZ_LINEAR_AUSTRAGEN7_REACH, mode=Mode.PRIVATE), bisect_by=aufsatz_linear_austragen7_end, keep=Keep.BOTH, mode=Mode.PRIVATE)
    add(aufsatz_linear_austragen7_tool2.solids().sort_by_distance((3.75, -37.651001, 70.268238))[0])

    # Skizze13 → Schnitt-Linear austragen2 (cut, two sides)
    with BuildSketch(Plane(origin=(50, 0, 0), x_dir=(0, 0, -1), z_dir=(1, 0, 0))) as schnitt_linear_austragen2_sk:
        Polygon((4, -47.000472849), (4, -75), (25.669622084, -47.000472849), align=None)
    extrude(amount=SCHNITT_LINEAR_AUSTRAGEN2_DEPTH, mode=Mode.SUBTRACT)
    extrude(schnitt_linear_austragen2_sk.sketch, amount=-SCHNITT_LINEAR_AUSTRAGEN2_DEPTH_BACK, mode=Mode.SUBTRACT)

    # Skizze14 → Aufsatz-Linear austragen8 (add)
    with BuildSketch(Plane(origin=(0, -99.846855704, -2), x_dir=(1, 0, 0), z_dir=(0, 0, 1))):
        with Locations((-20, 69.846855704)):
            Circle(SKIZZE14_R)
        with Locations((20, 69.846855704)):
            Circle(SKIZZE14_R)
        with Locations((-20, 129.846855704)):
            Circle(SKIZZE14_R)
        with Locations((20, 129.846855704)):
            Circle(SKIZZE14_R)
    extrude(amount=AUFSATZ_LINEAR_AUSTRAGEN8_DEPTH)

    # Kernloch für M4 Gewinde1
    with Locations(Plane.XY.offset(18)):
        with Locations((-20, 30), (20, 30), (20, -30), (-20, -30)):
            Hole(KERNLOCH_F_R_M4_GEWINDE1_D / 2, depth=KERNLOCH_F_R_M4_GEWINDE1_DEPTH)
            with Locations((0, 0, -(KERNLOCH_F_R_M4_GEWINDE1_DEPTH + KERNLOCH_F_R_M4_GEWINDE1_TIP / 2))):  # 118° drill point
                Cone(0, KERNLOCH_F_R_M4_GEWINDE1_D / 2, KERNLOCH_F_R_M4_GEWINDE1_TIP, mode=Mode.SUBTRACT)


solid = part_2.part
